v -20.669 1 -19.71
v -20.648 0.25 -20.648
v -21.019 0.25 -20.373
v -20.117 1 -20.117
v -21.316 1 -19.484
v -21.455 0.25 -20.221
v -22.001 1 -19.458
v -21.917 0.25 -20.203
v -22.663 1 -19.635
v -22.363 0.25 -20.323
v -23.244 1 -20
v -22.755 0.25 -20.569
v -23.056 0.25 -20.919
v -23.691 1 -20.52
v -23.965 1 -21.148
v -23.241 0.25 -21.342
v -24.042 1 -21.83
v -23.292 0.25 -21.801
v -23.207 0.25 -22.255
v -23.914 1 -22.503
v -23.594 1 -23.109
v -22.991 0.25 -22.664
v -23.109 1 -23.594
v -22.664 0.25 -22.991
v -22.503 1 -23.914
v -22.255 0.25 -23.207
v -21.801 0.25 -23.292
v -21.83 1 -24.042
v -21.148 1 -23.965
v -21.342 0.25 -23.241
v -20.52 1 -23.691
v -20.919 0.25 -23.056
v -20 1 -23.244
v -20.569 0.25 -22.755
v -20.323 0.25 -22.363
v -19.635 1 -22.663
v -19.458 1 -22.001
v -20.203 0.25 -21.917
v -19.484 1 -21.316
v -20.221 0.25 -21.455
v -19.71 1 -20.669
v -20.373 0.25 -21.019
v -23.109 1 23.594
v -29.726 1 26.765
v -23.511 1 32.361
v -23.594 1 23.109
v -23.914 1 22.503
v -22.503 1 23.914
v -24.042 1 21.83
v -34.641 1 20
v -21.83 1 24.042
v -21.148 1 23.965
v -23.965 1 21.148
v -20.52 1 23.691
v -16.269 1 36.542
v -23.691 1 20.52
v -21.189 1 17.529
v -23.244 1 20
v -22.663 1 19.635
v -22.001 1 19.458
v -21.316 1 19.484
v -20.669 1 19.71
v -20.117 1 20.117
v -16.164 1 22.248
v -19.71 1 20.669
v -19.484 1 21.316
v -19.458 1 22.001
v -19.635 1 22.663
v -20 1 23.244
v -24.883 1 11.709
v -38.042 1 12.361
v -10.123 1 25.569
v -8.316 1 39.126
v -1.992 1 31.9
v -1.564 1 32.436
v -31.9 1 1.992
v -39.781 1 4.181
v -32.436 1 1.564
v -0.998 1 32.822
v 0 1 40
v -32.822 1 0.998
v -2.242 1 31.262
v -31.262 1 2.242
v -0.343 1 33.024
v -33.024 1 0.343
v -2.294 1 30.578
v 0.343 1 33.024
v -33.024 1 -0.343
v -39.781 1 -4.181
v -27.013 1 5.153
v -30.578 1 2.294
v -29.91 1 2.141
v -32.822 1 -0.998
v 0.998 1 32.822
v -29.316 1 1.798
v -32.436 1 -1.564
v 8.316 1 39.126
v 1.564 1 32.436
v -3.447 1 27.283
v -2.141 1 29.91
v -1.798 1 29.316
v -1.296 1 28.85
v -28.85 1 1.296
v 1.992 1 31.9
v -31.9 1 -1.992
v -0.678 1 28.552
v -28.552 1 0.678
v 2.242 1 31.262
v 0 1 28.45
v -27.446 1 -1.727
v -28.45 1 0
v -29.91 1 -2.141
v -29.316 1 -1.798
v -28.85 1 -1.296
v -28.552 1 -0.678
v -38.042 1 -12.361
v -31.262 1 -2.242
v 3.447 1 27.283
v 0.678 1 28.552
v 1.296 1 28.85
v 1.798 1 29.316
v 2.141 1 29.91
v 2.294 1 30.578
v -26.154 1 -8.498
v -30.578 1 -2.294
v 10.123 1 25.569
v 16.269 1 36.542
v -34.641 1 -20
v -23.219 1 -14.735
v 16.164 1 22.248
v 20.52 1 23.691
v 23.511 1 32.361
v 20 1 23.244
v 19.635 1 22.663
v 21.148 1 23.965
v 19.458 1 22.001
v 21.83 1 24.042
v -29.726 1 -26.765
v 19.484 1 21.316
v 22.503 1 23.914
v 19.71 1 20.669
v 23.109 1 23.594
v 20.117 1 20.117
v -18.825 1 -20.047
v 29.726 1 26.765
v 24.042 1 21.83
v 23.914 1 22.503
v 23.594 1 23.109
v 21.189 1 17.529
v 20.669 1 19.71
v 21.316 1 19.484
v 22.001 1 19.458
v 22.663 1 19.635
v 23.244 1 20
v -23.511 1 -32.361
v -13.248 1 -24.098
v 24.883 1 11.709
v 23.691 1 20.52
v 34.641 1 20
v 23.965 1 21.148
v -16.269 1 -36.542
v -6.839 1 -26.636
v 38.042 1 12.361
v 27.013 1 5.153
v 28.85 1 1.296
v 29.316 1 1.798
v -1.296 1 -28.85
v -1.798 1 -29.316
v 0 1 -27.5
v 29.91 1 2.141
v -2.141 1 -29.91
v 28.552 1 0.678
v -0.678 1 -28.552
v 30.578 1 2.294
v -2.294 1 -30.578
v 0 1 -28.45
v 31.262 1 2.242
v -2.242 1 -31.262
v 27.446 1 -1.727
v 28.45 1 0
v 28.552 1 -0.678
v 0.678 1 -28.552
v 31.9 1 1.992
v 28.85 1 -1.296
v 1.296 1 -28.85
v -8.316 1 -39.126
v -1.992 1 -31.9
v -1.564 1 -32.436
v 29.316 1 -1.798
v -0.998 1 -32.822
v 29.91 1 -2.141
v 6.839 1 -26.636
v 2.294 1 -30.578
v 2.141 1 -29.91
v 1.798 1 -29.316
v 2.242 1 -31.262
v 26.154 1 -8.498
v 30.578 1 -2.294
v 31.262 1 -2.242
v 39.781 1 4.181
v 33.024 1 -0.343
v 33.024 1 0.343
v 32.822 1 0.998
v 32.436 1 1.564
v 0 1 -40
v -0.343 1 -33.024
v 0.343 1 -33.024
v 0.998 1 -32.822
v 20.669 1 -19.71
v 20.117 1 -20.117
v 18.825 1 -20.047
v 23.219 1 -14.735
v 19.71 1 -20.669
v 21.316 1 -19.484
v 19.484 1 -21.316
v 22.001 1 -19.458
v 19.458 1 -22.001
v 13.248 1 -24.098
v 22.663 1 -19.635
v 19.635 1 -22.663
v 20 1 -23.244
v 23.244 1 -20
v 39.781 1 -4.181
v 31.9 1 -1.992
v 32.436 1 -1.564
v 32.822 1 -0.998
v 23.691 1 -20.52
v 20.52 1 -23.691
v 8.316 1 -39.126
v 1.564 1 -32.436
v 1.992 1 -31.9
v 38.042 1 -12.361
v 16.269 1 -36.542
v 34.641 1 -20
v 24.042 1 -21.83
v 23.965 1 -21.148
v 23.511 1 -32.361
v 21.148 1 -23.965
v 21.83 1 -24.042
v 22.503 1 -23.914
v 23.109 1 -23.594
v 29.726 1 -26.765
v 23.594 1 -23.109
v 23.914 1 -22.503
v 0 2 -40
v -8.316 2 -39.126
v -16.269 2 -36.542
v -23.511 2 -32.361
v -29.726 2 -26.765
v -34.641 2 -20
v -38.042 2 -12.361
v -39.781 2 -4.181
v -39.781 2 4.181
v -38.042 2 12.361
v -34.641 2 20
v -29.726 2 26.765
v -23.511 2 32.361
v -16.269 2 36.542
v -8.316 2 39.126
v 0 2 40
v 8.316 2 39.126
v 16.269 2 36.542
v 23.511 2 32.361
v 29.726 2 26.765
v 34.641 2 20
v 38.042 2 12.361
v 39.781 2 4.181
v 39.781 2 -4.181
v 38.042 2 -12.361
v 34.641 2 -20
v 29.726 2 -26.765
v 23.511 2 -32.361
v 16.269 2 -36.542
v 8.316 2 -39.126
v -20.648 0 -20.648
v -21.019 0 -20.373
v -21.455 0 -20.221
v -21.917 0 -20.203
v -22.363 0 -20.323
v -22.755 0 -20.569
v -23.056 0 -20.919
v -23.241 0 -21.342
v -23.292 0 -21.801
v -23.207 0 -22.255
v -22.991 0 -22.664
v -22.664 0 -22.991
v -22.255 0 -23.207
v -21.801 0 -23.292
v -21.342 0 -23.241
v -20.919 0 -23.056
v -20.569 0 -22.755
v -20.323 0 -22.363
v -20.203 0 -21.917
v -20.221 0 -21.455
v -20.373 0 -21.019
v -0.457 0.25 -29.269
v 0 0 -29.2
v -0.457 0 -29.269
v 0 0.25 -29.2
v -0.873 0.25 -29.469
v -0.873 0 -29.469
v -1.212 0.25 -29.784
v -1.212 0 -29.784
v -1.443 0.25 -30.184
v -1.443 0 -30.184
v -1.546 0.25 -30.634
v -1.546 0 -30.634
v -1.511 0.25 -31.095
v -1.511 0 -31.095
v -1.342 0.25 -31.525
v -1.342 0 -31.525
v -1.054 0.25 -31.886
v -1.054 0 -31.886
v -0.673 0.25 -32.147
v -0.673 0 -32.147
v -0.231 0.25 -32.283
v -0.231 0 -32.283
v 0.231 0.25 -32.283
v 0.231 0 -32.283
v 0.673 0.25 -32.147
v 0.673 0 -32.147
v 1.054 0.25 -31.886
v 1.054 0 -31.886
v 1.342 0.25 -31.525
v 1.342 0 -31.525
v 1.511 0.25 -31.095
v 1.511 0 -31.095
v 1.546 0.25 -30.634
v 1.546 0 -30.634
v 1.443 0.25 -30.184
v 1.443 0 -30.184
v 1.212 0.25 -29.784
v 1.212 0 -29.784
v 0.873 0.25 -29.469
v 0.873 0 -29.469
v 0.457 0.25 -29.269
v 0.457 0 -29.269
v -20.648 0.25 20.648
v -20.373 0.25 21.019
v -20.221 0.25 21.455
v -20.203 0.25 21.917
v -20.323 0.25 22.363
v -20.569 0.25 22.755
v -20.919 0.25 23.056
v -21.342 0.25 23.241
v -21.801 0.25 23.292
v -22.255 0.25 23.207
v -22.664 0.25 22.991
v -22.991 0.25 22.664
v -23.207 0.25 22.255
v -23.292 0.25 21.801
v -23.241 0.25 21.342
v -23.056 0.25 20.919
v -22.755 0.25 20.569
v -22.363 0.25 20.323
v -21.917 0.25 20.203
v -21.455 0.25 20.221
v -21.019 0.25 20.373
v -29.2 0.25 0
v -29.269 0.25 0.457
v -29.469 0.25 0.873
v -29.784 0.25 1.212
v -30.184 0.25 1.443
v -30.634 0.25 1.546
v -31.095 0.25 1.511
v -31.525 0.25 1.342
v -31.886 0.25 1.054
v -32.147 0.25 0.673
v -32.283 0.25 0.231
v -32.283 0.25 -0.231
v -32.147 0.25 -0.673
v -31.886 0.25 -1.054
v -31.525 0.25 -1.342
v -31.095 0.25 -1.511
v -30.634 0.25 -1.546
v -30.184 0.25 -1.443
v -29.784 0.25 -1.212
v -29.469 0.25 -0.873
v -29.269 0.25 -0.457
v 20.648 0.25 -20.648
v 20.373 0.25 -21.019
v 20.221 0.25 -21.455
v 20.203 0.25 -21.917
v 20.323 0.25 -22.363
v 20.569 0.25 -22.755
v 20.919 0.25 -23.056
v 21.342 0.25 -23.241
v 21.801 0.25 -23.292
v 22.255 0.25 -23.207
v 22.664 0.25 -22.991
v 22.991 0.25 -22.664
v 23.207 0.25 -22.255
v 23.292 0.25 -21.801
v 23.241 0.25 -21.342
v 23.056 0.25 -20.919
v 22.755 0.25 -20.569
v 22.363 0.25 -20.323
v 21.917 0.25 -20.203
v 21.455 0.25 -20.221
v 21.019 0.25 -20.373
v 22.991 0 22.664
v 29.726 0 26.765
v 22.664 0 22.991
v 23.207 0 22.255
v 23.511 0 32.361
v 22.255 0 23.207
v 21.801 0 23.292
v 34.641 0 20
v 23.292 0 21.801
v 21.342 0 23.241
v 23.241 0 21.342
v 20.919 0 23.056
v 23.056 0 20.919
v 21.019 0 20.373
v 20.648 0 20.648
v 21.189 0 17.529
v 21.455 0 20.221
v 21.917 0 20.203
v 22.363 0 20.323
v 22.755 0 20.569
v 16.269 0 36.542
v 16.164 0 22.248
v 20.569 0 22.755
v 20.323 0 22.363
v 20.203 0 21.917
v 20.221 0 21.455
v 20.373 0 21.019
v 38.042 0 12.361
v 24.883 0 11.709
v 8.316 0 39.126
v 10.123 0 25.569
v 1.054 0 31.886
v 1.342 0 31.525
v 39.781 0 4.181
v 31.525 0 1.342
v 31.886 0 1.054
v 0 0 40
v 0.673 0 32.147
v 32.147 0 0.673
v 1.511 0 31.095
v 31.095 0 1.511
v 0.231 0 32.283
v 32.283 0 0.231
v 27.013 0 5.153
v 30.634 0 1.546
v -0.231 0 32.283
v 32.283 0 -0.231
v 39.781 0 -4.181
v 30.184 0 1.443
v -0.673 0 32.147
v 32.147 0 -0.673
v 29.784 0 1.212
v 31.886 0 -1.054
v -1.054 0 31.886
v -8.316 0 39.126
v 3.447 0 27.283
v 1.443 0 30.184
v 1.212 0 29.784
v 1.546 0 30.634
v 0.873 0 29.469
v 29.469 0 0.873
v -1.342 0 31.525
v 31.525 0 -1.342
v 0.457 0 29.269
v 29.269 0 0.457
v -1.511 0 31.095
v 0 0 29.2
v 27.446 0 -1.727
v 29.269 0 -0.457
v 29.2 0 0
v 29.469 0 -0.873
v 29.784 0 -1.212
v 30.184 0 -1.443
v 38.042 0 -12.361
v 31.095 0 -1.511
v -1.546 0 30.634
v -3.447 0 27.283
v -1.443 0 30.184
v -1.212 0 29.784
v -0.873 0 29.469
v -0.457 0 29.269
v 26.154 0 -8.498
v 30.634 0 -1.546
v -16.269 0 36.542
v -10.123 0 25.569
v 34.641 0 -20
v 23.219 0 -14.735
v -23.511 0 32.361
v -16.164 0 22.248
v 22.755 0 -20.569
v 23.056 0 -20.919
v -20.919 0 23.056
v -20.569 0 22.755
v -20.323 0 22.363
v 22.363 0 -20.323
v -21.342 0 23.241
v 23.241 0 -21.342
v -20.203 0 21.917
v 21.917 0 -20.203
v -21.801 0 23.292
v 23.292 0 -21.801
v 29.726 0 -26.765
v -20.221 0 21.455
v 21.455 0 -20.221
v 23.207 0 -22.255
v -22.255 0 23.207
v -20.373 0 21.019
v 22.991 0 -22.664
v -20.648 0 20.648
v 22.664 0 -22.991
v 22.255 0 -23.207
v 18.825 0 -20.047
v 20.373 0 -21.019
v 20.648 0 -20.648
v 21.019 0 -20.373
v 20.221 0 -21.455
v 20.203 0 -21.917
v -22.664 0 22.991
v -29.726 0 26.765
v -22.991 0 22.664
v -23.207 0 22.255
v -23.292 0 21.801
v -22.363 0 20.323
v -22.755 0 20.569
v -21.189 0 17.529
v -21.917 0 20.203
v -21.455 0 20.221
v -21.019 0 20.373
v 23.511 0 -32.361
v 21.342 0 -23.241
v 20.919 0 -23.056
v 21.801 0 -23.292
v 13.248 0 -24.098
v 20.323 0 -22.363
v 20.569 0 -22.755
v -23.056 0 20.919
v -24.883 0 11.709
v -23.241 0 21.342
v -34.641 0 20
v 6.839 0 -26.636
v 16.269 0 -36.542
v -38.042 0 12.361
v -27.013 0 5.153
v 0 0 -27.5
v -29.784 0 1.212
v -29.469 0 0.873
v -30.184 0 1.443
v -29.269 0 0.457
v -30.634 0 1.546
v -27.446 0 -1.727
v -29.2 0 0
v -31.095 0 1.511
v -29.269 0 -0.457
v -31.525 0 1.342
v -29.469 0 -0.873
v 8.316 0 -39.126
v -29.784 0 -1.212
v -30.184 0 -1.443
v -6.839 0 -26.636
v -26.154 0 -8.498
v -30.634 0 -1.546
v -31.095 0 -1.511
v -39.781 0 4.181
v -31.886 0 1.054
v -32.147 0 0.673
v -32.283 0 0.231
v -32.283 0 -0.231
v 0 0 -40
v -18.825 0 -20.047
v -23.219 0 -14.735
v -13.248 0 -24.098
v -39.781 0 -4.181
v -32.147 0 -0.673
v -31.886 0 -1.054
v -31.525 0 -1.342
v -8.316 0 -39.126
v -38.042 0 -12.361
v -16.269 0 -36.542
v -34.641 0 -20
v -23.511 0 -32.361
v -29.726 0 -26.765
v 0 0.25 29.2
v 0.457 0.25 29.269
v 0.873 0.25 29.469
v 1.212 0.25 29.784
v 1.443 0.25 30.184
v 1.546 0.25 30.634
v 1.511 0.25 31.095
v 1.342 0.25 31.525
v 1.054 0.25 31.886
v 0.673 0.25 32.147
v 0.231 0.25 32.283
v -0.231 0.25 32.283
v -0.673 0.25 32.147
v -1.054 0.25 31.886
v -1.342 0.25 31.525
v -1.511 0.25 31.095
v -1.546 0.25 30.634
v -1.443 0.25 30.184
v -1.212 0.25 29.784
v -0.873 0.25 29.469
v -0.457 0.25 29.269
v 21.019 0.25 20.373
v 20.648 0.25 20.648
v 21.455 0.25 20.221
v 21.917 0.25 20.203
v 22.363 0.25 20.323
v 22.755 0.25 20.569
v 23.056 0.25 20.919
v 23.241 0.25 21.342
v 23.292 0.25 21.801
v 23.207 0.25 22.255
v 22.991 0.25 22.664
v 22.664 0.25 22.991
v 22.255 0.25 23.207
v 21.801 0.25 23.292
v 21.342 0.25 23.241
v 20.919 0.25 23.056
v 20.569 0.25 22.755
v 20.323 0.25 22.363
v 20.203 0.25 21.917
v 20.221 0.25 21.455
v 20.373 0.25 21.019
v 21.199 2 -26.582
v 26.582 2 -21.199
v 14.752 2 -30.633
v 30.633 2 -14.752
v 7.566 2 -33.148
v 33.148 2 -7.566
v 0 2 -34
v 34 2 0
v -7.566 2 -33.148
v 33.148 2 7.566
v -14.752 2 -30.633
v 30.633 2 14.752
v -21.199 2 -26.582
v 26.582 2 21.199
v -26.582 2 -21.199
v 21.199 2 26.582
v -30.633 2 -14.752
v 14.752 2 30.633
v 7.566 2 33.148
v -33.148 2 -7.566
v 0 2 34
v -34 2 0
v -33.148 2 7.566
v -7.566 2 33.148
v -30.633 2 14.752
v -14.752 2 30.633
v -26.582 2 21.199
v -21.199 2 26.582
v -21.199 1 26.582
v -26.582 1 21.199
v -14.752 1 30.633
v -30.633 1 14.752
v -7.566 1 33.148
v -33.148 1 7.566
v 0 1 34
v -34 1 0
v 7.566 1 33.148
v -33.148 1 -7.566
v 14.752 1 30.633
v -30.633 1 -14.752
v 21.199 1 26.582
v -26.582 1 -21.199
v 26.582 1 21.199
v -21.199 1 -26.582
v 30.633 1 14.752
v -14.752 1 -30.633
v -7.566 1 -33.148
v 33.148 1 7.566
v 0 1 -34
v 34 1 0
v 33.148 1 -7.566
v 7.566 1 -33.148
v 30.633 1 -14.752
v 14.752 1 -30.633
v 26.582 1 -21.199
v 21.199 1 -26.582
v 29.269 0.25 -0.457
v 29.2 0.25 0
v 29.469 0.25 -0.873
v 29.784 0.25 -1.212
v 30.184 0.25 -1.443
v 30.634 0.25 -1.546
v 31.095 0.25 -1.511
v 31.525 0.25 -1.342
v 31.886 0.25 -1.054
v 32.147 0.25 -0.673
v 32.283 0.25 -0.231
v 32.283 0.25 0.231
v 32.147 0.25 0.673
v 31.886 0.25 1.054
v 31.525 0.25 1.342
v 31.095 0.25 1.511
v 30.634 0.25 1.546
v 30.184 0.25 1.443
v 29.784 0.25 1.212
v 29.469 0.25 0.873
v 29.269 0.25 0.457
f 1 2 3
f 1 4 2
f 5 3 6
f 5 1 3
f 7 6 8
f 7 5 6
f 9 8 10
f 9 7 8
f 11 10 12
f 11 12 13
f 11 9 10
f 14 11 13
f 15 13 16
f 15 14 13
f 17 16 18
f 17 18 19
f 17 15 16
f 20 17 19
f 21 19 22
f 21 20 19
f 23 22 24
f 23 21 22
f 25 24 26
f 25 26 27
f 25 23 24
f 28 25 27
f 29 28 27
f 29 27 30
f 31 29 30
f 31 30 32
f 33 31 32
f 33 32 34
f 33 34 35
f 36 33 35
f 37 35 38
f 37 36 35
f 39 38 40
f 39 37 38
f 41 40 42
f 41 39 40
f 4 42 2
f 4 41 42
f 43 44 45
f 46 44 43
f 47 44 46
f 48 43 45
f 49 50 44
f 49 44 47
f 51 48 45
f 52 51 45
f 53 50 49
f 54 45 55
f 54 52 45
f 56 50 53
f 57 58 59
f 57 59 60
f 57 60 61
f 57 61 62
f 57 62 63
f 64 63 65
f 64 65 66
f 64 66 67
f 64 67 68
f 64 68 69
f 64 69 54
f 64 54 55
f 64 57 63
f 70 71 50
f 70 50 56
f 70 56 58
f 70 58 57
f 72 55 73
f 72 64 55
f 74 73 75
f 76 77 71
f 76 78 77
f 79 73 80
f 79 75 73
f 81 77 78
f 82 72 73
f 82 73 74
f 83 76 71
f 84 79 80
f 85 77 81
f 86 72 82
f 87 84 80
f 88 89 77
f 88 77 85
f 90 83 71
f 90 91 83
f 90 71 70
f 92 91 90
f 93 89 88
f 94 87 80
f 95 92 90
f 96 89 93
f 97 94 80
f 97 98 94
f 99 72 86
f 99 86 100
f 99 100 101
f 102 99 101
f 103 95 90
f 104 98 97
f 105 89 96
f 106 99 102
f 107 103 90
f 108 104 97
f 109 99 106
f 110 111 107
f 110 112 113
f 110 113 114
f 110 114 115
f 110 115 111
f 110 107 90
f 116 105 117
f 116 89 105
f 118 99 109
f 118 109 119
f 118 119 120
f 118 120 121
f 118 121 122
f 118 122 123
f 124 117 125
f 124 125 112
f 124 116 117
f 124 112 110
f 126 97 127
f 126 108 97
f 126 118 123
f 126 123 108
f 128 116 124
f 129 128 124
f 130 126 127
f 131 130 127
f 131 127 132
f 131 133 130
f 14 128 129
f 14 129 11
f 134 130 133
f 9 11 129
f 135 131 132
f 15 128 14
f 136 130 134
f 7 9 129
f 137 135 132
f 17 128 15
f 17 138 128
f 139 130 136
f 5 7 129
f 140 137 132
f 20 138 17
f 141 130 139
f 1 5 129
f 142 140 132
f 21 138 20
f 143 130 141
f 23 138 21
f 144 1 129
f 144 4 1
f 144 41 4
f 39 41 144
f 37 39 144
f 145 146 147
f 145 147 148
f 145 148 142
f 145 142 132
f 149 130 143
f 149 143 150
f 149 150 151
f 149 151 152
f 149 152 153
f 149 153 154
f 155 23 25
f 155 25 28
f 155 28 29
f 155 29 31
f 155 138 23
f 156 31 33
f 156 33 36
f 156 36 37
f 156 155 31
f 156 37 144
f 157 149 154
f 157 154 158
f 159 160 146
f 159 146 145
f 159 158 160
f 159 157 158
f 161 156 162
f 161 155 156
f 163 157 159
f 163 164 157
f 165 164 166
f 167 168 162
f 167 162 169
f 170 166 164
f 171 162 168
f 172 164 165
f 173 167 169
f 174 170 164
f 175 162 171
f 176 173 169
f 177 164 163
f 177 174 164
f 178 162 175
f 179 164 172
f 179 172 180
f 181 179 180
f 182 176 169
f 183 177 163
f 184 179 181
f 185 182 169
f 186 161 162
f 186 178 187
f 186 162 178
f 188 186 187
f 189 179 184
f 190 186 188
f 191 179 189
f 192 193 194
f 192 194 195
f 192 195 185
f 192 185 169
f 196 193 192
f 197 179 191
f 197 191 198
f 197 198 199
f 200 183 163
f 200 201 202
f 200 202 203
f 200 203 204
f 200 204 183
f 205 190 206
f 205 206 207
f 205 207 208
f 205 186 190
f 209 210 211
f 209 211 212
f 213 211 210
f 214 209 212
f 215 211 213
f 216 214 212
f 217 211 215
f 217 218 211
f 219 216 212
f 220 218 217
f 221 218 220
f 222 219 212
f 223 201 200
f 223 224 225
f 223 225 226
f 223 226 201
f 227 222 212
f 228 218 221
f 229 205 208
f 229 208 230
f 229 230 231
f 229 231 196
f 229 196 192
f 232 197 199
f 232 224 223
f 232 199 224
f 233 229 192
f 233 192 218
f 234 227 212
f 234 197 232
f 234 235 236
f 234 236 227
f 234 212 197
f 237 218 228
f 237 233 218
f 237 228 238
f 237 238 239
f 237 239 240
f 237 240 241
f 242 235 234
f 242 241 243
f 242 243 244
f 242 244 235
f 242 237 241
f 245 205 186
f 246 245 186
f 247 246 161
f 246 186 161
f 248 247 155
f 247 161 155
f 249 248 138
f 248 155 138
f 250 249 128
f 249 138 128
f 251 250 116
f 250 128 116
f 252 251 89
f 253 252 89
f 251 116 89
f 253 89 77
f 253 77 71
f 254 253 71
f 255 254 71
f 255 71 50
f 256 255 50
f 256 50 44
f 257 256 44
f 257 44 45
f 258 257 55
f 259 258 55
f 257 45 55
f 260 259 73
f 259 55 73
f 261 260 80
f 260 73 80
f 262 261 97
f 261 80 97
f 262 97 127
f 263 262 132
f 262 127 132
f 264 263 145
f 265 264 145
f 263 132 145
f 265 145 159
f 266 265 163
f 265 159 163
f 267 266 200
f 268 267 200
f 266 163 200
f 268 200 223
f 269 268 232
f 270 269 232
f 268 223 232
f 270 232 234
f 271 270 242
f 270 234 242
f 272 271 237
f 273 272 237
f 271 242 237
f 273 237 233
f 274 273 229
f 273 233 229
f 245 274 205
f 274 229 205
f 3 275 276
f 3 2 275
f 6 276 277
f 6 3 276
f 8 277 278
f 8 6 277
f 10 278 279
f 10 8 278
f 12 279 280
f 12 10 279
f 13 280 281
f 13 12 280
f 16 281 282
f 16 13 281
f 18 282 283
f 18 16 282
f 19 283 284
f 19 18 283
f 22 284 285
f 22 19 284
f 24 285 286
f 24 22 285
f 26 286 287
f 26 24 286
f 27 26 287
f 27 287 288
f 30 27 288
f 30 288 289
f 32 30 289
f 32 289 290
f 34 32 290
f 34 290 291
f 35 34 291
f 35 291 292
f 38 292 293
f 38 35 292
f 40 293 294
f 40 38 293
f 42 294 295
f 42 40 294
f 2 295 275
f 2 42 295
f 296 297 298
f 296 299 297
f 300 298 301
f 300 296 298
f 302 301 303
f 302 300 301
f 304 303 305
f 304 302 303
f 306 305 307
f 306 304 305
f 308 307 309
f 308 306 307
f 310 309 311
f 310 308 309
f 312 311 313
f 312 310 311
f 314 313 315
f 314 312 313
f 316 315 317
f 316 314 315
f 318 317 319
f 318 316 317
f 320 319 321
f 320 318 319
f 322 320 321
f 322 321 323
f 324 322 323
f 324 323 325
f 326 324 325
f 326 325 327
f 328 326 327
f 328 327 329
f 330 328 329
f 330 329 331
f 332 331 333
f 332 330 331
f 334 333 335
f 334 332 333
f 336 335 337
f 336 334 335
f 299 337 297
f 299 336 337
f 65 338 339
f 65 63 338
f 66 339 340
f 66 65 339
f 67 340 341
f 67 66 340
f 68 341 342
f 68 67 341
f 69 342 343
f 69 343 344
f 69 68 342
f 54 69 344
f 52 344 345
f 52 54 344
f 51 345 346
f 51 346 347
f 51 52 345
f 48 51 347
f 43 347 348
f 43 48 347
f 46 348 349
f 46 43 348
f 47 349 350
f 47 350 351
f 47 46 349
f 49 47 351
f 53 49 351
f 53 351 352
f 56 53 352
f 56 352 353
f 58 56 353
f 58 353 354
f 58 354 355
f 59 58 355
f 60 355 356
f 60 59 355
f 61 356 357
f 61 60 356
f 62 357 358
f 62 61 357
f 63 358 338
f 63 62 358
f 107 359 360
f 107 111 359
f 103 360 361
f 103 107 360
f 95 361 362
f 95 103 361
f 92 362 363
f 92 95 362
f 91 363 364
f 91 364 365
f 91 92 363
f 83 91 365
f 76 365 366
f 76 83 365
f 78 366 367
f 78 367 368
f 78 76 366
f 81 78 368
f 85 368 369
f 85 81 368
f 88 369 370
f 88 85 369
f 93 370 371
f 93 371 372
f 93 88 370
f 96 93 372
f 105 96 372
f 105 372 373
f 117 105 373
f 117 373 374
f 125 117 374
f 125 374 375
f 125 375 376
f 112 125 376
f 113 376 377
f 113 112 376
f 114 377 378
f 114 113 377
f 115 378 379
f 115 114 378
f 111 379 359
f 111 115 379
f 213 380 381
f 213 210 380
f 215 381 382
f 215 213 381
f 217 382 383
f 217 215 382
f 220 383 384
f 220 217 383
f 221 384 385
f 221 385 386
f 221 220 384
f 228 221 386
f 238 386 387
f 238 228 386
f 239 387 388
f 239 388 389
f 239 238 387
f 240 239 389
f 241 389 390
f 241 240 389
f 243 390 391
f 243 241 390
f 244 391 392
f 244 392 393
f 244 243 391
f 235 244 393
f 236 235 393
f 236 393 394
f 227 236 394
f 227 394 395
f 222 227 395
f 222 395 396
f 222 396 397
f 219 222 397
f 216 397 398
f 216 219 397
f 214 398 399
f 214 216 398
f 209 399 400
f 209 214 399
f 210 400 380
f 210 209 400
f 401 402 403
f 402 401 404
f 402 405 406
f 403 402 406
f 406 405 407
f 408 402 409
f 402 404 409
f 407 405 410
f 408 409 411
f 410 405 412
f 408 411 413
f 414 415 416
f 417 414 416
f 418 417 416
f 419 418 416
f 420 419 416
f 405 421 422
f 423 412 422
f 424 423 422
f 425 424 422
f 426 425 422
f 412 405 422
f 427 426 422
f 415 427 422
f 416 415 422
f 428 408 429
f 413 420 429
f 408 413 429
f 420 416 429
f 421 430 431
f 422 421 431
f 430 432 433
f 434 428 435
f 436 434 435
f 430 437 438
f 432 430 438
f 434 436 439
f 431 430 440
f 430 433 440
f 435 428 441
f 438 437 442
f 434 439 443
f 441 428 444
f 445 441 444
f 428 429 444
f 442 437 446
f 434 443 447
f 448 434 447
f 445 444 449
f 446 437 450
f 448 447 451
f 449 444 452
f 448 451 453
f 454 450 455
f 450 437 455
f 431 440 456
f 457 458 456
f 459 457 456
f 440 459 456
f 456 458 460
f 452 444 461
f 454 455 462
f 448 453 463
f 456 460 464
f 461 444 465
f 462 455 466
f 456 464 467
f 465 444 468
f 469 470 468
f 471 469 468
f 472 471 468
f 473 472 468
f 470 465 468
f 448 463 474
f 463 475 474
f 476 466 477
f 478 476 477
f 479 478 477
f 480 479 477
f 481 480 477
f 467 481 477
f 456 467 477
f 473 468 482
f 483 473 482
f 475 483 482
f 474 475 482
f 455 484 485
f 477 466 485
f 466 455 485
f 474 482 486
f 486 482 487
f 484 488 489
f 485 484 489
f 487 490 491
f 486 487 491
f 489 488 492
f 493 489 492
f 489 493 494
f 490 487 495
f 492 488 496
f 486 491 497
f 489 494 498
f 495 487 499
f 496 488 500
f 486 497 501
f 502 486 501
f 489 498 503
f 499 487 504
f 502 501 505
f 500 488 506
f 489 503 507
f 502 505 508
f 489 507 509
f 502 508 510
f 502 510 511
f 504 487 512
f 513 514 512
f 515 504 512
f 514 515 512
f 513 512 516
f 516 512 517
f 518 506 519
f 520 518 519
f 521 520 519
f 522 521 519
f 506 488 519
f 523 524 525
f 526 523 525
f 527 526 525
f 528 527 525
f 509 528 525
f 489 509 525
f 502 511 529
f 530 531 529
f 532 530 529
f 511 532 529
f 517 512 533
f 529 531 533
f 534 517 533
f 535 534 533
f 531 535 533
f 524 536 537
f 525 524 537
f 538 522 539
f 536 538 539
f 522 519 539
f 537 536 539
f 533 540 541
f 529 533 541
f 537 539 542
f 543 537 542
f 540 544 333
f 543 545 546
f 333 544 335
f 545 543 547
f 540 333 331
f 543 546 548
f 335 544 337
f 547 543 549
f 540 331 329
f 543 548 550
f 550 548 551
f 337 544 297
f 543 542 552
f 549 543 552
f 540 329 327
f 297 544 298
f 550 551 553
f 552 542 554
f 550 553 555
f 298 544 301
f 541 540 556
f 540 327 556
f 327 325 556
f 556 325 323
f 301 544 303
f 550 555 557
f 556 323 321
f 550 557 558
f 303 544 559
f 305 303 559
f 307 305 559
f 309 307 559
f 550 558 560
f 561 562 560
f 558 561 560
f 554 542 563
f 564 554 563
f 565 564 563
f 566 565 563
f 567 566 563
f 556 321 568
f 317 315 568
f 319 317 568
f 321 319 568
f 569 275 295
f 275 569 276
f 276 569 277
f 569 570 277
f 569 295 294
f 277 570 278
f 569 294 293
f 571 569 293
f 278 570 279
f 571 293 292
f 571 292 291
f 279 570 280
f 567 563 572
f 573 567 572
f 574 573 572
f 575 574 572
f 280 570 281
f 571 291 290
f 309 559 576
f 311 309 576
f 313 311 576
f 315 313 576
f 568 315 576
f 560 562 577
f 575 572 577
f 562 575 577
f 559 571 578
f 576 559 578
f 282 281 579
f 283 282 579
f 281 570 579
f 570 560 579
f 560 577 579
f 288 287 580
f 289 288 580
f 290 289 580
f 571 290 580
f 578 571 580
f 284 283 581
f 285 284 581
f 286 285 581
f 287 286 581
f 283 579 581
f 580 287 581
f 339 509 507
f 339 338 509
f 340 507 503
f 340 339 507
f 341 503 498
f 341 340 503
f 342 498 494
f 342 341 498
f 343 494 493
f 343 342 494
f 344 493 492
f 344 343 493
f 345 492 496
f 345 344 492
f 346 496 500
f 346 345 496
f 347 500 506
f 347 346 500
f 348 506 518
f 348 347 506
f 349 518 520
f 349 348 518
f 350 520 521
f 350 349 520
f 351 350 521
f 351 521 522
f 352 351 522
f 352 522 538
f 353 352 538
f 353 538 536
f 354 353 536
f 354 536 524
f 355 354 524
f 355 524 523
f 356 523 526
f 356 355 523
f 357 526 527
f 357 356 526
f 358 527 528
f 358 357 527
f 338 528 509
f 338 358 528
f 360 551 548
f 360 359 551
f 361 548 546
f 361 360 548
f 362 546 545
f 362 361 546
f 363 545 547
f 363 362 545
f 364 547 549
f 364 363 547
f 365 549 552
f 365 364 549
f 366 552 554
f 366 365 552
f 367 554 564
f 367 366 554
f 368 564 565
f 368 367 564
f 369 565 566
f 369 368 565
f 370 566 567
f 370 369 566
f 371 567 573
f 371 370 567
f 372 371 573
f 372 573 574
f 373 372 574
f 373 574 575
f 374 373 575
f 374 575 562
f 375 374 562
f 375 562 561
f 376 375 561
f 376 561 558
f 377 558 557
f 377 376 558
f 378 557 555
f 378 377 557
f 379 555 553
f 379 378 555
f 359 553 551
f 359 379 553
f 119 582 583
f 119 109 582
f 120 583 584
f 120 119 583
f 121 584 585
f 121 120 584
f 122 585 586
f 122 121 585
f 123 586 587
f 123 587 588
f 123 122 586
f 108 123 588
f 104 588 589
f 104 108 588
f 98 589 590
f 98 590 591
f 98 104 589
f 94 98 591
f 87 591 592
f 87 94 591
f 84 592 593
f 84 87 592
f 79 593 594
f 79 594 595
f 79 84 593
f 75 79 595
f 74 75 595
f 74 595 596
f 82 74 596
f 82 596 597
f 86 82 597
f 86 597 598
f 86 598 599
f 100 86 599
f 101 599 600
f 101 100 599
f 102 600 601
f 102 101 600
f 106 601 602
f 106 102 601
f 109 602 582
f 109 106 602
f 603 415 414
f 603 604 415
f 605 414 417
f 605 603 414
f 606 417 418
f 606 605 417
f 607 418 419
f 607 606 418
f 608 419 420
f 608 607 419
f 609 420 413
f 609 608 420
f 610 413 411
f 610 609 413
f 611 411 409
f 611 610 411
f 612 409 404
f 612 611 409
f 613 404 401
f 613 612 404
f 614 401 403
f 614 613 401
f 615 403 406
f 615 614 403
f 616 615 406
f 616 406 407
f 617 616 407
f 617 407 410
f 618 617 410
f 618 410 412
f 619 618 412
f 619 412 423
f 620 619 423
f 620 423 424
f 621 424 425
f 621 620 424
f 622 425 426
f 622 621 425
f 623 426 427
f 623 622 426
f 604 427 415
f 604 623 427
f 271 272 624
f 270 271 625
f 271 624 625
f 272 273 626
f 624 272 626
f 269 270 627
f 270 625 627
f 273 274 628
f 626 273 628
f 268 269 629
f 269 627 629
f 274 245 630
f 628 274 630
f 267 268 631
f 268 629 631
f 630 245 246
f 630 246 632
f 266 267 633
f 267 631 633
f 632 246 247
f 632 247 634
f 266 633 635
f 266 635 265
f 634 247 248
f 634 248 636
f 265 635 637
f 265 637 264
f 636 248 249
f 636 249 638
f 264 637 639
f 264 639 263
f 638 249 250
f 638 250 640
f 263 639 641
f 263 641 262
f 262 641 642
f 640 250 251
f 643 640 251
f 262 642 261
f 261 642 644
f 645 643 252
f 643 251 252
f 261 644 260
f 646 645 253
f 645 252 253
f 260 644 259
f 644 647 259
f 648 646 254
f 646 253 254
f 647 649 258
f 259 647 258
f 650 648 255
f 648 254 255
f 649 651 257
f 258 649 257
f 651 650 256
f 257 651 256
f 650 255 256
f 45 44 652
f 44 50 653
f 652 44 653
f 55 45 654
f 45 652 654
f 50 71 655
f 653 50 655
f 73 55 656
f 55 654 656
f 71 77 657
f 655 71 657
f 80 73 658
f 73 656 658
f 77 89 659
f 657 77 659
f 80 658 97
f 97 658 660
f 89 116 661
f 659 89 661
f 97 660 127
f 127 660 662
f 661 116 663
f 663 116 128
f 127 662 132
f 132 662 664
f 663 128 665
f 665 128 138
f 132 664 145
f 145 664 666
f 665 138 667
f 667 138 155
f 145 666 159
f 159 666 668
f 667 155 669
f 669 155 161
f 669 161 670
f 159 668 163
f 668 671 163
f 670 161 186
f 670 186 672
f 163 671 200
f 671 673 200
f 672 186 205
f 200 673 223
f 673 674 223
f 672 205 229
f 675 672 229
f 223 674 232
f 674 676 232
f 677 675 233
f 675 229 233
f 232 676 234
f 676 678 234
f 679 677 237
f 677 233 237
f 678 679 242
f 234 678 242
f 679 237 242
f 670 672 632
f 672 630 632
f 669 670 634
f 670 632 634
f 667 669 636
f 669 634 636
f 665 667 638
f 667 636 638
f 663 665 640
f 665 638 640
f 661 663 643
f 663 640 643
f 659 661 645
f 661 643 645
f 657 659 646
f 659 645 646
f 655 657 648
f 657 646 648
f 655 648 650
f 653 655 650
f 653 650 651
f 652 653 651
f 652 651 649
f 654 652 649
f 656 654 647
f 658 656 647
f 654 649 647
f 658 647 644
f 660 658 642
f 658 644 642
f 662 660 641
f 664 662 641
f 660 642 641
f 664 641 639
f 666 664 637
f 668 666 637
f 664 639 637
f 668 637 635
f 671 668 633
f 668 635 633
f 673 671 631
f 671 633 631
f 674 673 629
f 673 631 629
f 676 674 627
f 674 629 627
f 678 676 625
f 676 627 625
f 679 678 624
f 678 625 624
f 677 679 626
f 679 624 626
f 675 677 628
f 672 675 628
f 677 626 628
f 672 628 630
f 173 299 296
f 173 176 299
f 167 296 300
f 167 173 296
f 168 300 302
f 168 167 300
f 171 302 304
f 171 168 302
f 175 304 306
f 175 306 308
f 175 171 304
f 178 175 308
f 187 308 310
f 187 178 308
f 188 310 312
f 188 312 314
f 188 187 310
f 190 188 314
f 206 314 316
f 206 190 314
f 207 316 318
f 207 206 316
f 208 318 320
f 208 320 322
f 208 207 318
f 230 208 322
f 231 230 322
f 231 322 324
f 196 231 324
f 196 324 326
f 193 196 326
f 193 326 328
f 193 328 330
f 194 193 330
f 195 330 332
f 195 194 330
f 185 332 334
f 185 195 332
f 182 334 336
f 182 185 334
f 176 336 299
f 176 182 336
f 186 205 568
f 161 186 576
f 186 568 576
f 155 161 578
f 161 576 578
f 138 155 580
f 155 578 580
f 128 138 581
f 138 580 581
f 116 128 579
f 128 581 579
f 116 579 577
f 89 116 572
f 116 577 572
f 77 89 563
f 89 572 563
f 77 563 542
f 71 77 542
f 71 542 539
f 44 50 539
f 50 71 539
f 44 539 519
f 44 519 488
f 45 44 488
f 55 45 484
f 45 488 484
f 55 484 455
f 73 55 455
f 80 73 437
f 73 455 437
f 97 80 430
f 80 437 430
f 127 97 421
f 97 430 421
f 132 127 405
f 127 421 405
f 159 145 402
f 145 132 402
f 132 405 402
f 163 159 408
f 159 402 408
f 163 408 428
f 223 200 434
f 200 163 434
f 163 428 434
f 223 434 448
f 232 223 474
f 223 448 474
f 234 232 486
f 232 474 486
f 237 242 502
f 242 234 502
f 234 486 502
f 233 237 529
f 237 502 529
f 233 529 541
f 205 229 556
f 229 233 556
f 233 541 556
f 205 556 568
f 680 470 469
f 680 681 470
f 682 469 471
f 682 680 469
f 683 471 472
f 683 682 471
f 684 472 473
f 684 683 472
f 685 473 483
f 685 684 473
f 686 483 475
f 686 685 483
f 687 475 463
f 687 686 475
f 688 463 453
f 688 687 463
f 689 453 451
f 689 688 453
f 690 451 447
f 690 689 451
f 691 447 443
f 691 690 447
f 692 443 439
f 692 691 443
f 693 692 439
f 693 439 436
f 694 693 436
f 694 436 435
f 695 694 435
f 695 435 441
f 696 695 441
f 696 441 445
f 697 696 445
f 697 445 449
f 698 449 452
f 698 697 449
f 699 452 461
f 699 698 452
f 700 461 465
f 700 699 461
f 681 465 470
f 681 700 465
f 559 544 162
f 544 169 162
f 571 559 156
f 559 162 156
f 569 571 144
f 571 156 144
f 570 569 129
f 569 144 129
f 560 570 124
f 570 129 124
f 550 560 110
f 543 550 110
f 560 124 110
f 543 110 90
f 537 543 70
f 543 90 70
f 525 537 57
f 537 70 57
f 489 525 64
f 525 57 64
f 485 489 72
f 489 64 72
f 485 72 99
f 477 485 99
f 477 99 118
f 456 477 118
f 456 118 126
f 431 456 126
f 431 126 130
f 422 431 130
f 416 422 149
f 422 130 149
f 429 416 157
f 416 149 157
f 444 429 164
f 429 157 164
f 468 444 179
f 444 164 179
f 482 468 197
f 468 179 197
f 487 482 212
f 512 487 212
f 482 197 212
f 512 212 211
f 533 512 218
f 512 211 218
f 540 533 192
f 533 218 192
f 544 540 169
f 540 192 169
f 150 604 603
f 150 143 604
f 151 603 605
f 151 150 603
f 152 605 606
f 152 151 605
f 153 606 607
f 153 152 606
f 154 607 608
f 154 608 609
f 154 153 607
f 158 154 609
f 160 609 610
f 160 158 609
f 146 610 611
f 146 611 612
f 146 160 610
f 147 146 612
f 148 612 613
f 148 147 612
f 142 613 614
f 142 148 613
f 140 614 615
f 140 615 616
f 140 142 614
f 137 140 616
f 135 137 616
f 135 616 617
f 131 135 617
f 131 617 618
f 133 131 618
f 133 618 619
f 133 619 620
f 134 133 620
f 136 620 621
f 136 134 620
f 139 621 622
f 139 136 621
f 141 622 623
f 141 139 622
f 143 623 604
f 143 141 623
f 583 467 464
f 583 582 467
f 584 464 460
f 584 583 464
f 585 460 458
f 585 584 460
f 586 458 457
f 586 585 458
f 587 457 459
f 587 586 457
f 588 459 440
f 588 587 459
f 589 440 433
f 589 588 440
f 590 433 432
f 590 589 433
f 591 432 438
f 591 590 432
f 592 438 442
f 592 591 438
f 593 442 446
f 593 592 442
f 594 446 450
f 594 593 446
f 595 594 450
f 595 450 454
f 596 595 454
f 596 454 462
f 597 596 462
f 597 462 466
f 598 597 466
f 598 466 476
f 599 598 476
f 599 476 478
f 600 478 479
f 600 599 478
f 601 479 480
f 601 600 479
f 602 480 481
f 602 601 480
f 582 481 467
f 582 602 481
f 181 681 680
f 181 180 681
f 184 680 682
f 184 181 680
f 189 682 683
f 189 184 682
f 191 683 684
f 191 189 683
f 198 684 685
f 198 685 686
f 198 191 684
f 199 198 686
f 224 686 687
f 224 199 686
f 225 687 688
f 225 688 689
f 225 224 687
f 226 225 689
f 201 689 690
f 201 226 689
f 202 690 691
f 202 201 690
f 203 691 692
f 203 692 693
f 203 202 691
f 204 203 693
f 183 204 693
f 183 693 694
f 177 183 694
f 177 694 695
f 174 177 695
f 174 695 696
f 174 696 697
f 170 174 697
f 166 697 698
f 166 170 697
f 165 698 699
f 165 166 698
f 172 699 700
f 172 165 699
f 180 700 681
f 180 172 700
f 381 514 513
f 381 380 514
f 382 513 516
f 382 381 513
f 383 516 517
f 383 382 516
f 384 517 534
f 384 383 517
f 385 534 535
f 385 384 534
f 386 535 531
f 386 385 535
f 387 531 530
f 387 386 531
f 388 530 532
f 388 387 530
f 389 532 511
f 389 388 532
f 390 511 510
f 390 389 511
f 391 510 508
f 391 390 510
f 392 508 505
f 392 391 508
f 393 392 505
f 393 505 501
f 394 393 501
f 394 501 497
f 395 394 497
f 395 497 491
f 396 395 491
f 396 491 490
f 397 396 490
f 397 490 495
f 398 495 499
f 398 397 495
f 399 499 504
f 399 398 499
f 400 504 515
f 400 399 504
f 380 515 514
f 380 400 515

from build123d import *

# Parameters (mm, degrees)
CIRPATTERN1_COUNT = 8


with BuildPart() as part:
    # Sketch1 → Revolve1 (revolve)
    with BuildSketch(Plane.XY):
        Polygon((-40, 0), (-27.5, 0), (-27.5, 1), (-34, 1), (-34, 2), (-40, 2), align=None)
    revolve(axis=Axis((0, 0, 0), (0, 1, 0)))

    # Sketch2 → CSK for M2.5 Countersunk Flat Head Screw1 (revolve, cut)
    with BuildSketch(Plane(origin=(0, 1, -30.75), x_dir=(0, 0, 1), z_dir=(1, 0, 0))):
        Polygon((0, 0), (0, 1), (1.55, 1), (1.55, 0.75), (2.3, 0), align=None)
    csk_for_m2_5_countersunk_flat_head_screw = revolve(axis=Axis((0, 7.35, -30.75), (0, -1, 0)), mode=Mode.SUBTRACT)

    # CirPattern1: CSK for M2.5 Countersunk Flat Head Screw1 ×8 about axis
    cirpattern1_axis = Axis((0, 1, 0), (0, -1, 0))
    for i in range(1, CIRPATTERN1_COUNT):
        add(csk_for_m2_5_countersunk_flat_head_screw.rotate(cirpattern1_axis, i * 360 / CIRPATTERN1_COUNT), mode=Mode.SUBTRACT)


with BuildPart() as body_2:
    # Split1: the piece on the far side of the plane
    add(part.part)
    split(bisect_by=Plane(origin=(-34, 1, 0), x_dir=(0, 0, -1), z_dir=(0, -1, 0)), keep=Keep.BOTTOM)


with BuildPart() as part_1:
    add(part.part)

    # Split1
    split(bisect_by=Plane(origin=(-34, 1, 0), x_dir=(0, 0, -1), z_dir=(0, -1, 0)), keep=Keep.TOP)


solid = Compound([body_2.part, part_1.part])
